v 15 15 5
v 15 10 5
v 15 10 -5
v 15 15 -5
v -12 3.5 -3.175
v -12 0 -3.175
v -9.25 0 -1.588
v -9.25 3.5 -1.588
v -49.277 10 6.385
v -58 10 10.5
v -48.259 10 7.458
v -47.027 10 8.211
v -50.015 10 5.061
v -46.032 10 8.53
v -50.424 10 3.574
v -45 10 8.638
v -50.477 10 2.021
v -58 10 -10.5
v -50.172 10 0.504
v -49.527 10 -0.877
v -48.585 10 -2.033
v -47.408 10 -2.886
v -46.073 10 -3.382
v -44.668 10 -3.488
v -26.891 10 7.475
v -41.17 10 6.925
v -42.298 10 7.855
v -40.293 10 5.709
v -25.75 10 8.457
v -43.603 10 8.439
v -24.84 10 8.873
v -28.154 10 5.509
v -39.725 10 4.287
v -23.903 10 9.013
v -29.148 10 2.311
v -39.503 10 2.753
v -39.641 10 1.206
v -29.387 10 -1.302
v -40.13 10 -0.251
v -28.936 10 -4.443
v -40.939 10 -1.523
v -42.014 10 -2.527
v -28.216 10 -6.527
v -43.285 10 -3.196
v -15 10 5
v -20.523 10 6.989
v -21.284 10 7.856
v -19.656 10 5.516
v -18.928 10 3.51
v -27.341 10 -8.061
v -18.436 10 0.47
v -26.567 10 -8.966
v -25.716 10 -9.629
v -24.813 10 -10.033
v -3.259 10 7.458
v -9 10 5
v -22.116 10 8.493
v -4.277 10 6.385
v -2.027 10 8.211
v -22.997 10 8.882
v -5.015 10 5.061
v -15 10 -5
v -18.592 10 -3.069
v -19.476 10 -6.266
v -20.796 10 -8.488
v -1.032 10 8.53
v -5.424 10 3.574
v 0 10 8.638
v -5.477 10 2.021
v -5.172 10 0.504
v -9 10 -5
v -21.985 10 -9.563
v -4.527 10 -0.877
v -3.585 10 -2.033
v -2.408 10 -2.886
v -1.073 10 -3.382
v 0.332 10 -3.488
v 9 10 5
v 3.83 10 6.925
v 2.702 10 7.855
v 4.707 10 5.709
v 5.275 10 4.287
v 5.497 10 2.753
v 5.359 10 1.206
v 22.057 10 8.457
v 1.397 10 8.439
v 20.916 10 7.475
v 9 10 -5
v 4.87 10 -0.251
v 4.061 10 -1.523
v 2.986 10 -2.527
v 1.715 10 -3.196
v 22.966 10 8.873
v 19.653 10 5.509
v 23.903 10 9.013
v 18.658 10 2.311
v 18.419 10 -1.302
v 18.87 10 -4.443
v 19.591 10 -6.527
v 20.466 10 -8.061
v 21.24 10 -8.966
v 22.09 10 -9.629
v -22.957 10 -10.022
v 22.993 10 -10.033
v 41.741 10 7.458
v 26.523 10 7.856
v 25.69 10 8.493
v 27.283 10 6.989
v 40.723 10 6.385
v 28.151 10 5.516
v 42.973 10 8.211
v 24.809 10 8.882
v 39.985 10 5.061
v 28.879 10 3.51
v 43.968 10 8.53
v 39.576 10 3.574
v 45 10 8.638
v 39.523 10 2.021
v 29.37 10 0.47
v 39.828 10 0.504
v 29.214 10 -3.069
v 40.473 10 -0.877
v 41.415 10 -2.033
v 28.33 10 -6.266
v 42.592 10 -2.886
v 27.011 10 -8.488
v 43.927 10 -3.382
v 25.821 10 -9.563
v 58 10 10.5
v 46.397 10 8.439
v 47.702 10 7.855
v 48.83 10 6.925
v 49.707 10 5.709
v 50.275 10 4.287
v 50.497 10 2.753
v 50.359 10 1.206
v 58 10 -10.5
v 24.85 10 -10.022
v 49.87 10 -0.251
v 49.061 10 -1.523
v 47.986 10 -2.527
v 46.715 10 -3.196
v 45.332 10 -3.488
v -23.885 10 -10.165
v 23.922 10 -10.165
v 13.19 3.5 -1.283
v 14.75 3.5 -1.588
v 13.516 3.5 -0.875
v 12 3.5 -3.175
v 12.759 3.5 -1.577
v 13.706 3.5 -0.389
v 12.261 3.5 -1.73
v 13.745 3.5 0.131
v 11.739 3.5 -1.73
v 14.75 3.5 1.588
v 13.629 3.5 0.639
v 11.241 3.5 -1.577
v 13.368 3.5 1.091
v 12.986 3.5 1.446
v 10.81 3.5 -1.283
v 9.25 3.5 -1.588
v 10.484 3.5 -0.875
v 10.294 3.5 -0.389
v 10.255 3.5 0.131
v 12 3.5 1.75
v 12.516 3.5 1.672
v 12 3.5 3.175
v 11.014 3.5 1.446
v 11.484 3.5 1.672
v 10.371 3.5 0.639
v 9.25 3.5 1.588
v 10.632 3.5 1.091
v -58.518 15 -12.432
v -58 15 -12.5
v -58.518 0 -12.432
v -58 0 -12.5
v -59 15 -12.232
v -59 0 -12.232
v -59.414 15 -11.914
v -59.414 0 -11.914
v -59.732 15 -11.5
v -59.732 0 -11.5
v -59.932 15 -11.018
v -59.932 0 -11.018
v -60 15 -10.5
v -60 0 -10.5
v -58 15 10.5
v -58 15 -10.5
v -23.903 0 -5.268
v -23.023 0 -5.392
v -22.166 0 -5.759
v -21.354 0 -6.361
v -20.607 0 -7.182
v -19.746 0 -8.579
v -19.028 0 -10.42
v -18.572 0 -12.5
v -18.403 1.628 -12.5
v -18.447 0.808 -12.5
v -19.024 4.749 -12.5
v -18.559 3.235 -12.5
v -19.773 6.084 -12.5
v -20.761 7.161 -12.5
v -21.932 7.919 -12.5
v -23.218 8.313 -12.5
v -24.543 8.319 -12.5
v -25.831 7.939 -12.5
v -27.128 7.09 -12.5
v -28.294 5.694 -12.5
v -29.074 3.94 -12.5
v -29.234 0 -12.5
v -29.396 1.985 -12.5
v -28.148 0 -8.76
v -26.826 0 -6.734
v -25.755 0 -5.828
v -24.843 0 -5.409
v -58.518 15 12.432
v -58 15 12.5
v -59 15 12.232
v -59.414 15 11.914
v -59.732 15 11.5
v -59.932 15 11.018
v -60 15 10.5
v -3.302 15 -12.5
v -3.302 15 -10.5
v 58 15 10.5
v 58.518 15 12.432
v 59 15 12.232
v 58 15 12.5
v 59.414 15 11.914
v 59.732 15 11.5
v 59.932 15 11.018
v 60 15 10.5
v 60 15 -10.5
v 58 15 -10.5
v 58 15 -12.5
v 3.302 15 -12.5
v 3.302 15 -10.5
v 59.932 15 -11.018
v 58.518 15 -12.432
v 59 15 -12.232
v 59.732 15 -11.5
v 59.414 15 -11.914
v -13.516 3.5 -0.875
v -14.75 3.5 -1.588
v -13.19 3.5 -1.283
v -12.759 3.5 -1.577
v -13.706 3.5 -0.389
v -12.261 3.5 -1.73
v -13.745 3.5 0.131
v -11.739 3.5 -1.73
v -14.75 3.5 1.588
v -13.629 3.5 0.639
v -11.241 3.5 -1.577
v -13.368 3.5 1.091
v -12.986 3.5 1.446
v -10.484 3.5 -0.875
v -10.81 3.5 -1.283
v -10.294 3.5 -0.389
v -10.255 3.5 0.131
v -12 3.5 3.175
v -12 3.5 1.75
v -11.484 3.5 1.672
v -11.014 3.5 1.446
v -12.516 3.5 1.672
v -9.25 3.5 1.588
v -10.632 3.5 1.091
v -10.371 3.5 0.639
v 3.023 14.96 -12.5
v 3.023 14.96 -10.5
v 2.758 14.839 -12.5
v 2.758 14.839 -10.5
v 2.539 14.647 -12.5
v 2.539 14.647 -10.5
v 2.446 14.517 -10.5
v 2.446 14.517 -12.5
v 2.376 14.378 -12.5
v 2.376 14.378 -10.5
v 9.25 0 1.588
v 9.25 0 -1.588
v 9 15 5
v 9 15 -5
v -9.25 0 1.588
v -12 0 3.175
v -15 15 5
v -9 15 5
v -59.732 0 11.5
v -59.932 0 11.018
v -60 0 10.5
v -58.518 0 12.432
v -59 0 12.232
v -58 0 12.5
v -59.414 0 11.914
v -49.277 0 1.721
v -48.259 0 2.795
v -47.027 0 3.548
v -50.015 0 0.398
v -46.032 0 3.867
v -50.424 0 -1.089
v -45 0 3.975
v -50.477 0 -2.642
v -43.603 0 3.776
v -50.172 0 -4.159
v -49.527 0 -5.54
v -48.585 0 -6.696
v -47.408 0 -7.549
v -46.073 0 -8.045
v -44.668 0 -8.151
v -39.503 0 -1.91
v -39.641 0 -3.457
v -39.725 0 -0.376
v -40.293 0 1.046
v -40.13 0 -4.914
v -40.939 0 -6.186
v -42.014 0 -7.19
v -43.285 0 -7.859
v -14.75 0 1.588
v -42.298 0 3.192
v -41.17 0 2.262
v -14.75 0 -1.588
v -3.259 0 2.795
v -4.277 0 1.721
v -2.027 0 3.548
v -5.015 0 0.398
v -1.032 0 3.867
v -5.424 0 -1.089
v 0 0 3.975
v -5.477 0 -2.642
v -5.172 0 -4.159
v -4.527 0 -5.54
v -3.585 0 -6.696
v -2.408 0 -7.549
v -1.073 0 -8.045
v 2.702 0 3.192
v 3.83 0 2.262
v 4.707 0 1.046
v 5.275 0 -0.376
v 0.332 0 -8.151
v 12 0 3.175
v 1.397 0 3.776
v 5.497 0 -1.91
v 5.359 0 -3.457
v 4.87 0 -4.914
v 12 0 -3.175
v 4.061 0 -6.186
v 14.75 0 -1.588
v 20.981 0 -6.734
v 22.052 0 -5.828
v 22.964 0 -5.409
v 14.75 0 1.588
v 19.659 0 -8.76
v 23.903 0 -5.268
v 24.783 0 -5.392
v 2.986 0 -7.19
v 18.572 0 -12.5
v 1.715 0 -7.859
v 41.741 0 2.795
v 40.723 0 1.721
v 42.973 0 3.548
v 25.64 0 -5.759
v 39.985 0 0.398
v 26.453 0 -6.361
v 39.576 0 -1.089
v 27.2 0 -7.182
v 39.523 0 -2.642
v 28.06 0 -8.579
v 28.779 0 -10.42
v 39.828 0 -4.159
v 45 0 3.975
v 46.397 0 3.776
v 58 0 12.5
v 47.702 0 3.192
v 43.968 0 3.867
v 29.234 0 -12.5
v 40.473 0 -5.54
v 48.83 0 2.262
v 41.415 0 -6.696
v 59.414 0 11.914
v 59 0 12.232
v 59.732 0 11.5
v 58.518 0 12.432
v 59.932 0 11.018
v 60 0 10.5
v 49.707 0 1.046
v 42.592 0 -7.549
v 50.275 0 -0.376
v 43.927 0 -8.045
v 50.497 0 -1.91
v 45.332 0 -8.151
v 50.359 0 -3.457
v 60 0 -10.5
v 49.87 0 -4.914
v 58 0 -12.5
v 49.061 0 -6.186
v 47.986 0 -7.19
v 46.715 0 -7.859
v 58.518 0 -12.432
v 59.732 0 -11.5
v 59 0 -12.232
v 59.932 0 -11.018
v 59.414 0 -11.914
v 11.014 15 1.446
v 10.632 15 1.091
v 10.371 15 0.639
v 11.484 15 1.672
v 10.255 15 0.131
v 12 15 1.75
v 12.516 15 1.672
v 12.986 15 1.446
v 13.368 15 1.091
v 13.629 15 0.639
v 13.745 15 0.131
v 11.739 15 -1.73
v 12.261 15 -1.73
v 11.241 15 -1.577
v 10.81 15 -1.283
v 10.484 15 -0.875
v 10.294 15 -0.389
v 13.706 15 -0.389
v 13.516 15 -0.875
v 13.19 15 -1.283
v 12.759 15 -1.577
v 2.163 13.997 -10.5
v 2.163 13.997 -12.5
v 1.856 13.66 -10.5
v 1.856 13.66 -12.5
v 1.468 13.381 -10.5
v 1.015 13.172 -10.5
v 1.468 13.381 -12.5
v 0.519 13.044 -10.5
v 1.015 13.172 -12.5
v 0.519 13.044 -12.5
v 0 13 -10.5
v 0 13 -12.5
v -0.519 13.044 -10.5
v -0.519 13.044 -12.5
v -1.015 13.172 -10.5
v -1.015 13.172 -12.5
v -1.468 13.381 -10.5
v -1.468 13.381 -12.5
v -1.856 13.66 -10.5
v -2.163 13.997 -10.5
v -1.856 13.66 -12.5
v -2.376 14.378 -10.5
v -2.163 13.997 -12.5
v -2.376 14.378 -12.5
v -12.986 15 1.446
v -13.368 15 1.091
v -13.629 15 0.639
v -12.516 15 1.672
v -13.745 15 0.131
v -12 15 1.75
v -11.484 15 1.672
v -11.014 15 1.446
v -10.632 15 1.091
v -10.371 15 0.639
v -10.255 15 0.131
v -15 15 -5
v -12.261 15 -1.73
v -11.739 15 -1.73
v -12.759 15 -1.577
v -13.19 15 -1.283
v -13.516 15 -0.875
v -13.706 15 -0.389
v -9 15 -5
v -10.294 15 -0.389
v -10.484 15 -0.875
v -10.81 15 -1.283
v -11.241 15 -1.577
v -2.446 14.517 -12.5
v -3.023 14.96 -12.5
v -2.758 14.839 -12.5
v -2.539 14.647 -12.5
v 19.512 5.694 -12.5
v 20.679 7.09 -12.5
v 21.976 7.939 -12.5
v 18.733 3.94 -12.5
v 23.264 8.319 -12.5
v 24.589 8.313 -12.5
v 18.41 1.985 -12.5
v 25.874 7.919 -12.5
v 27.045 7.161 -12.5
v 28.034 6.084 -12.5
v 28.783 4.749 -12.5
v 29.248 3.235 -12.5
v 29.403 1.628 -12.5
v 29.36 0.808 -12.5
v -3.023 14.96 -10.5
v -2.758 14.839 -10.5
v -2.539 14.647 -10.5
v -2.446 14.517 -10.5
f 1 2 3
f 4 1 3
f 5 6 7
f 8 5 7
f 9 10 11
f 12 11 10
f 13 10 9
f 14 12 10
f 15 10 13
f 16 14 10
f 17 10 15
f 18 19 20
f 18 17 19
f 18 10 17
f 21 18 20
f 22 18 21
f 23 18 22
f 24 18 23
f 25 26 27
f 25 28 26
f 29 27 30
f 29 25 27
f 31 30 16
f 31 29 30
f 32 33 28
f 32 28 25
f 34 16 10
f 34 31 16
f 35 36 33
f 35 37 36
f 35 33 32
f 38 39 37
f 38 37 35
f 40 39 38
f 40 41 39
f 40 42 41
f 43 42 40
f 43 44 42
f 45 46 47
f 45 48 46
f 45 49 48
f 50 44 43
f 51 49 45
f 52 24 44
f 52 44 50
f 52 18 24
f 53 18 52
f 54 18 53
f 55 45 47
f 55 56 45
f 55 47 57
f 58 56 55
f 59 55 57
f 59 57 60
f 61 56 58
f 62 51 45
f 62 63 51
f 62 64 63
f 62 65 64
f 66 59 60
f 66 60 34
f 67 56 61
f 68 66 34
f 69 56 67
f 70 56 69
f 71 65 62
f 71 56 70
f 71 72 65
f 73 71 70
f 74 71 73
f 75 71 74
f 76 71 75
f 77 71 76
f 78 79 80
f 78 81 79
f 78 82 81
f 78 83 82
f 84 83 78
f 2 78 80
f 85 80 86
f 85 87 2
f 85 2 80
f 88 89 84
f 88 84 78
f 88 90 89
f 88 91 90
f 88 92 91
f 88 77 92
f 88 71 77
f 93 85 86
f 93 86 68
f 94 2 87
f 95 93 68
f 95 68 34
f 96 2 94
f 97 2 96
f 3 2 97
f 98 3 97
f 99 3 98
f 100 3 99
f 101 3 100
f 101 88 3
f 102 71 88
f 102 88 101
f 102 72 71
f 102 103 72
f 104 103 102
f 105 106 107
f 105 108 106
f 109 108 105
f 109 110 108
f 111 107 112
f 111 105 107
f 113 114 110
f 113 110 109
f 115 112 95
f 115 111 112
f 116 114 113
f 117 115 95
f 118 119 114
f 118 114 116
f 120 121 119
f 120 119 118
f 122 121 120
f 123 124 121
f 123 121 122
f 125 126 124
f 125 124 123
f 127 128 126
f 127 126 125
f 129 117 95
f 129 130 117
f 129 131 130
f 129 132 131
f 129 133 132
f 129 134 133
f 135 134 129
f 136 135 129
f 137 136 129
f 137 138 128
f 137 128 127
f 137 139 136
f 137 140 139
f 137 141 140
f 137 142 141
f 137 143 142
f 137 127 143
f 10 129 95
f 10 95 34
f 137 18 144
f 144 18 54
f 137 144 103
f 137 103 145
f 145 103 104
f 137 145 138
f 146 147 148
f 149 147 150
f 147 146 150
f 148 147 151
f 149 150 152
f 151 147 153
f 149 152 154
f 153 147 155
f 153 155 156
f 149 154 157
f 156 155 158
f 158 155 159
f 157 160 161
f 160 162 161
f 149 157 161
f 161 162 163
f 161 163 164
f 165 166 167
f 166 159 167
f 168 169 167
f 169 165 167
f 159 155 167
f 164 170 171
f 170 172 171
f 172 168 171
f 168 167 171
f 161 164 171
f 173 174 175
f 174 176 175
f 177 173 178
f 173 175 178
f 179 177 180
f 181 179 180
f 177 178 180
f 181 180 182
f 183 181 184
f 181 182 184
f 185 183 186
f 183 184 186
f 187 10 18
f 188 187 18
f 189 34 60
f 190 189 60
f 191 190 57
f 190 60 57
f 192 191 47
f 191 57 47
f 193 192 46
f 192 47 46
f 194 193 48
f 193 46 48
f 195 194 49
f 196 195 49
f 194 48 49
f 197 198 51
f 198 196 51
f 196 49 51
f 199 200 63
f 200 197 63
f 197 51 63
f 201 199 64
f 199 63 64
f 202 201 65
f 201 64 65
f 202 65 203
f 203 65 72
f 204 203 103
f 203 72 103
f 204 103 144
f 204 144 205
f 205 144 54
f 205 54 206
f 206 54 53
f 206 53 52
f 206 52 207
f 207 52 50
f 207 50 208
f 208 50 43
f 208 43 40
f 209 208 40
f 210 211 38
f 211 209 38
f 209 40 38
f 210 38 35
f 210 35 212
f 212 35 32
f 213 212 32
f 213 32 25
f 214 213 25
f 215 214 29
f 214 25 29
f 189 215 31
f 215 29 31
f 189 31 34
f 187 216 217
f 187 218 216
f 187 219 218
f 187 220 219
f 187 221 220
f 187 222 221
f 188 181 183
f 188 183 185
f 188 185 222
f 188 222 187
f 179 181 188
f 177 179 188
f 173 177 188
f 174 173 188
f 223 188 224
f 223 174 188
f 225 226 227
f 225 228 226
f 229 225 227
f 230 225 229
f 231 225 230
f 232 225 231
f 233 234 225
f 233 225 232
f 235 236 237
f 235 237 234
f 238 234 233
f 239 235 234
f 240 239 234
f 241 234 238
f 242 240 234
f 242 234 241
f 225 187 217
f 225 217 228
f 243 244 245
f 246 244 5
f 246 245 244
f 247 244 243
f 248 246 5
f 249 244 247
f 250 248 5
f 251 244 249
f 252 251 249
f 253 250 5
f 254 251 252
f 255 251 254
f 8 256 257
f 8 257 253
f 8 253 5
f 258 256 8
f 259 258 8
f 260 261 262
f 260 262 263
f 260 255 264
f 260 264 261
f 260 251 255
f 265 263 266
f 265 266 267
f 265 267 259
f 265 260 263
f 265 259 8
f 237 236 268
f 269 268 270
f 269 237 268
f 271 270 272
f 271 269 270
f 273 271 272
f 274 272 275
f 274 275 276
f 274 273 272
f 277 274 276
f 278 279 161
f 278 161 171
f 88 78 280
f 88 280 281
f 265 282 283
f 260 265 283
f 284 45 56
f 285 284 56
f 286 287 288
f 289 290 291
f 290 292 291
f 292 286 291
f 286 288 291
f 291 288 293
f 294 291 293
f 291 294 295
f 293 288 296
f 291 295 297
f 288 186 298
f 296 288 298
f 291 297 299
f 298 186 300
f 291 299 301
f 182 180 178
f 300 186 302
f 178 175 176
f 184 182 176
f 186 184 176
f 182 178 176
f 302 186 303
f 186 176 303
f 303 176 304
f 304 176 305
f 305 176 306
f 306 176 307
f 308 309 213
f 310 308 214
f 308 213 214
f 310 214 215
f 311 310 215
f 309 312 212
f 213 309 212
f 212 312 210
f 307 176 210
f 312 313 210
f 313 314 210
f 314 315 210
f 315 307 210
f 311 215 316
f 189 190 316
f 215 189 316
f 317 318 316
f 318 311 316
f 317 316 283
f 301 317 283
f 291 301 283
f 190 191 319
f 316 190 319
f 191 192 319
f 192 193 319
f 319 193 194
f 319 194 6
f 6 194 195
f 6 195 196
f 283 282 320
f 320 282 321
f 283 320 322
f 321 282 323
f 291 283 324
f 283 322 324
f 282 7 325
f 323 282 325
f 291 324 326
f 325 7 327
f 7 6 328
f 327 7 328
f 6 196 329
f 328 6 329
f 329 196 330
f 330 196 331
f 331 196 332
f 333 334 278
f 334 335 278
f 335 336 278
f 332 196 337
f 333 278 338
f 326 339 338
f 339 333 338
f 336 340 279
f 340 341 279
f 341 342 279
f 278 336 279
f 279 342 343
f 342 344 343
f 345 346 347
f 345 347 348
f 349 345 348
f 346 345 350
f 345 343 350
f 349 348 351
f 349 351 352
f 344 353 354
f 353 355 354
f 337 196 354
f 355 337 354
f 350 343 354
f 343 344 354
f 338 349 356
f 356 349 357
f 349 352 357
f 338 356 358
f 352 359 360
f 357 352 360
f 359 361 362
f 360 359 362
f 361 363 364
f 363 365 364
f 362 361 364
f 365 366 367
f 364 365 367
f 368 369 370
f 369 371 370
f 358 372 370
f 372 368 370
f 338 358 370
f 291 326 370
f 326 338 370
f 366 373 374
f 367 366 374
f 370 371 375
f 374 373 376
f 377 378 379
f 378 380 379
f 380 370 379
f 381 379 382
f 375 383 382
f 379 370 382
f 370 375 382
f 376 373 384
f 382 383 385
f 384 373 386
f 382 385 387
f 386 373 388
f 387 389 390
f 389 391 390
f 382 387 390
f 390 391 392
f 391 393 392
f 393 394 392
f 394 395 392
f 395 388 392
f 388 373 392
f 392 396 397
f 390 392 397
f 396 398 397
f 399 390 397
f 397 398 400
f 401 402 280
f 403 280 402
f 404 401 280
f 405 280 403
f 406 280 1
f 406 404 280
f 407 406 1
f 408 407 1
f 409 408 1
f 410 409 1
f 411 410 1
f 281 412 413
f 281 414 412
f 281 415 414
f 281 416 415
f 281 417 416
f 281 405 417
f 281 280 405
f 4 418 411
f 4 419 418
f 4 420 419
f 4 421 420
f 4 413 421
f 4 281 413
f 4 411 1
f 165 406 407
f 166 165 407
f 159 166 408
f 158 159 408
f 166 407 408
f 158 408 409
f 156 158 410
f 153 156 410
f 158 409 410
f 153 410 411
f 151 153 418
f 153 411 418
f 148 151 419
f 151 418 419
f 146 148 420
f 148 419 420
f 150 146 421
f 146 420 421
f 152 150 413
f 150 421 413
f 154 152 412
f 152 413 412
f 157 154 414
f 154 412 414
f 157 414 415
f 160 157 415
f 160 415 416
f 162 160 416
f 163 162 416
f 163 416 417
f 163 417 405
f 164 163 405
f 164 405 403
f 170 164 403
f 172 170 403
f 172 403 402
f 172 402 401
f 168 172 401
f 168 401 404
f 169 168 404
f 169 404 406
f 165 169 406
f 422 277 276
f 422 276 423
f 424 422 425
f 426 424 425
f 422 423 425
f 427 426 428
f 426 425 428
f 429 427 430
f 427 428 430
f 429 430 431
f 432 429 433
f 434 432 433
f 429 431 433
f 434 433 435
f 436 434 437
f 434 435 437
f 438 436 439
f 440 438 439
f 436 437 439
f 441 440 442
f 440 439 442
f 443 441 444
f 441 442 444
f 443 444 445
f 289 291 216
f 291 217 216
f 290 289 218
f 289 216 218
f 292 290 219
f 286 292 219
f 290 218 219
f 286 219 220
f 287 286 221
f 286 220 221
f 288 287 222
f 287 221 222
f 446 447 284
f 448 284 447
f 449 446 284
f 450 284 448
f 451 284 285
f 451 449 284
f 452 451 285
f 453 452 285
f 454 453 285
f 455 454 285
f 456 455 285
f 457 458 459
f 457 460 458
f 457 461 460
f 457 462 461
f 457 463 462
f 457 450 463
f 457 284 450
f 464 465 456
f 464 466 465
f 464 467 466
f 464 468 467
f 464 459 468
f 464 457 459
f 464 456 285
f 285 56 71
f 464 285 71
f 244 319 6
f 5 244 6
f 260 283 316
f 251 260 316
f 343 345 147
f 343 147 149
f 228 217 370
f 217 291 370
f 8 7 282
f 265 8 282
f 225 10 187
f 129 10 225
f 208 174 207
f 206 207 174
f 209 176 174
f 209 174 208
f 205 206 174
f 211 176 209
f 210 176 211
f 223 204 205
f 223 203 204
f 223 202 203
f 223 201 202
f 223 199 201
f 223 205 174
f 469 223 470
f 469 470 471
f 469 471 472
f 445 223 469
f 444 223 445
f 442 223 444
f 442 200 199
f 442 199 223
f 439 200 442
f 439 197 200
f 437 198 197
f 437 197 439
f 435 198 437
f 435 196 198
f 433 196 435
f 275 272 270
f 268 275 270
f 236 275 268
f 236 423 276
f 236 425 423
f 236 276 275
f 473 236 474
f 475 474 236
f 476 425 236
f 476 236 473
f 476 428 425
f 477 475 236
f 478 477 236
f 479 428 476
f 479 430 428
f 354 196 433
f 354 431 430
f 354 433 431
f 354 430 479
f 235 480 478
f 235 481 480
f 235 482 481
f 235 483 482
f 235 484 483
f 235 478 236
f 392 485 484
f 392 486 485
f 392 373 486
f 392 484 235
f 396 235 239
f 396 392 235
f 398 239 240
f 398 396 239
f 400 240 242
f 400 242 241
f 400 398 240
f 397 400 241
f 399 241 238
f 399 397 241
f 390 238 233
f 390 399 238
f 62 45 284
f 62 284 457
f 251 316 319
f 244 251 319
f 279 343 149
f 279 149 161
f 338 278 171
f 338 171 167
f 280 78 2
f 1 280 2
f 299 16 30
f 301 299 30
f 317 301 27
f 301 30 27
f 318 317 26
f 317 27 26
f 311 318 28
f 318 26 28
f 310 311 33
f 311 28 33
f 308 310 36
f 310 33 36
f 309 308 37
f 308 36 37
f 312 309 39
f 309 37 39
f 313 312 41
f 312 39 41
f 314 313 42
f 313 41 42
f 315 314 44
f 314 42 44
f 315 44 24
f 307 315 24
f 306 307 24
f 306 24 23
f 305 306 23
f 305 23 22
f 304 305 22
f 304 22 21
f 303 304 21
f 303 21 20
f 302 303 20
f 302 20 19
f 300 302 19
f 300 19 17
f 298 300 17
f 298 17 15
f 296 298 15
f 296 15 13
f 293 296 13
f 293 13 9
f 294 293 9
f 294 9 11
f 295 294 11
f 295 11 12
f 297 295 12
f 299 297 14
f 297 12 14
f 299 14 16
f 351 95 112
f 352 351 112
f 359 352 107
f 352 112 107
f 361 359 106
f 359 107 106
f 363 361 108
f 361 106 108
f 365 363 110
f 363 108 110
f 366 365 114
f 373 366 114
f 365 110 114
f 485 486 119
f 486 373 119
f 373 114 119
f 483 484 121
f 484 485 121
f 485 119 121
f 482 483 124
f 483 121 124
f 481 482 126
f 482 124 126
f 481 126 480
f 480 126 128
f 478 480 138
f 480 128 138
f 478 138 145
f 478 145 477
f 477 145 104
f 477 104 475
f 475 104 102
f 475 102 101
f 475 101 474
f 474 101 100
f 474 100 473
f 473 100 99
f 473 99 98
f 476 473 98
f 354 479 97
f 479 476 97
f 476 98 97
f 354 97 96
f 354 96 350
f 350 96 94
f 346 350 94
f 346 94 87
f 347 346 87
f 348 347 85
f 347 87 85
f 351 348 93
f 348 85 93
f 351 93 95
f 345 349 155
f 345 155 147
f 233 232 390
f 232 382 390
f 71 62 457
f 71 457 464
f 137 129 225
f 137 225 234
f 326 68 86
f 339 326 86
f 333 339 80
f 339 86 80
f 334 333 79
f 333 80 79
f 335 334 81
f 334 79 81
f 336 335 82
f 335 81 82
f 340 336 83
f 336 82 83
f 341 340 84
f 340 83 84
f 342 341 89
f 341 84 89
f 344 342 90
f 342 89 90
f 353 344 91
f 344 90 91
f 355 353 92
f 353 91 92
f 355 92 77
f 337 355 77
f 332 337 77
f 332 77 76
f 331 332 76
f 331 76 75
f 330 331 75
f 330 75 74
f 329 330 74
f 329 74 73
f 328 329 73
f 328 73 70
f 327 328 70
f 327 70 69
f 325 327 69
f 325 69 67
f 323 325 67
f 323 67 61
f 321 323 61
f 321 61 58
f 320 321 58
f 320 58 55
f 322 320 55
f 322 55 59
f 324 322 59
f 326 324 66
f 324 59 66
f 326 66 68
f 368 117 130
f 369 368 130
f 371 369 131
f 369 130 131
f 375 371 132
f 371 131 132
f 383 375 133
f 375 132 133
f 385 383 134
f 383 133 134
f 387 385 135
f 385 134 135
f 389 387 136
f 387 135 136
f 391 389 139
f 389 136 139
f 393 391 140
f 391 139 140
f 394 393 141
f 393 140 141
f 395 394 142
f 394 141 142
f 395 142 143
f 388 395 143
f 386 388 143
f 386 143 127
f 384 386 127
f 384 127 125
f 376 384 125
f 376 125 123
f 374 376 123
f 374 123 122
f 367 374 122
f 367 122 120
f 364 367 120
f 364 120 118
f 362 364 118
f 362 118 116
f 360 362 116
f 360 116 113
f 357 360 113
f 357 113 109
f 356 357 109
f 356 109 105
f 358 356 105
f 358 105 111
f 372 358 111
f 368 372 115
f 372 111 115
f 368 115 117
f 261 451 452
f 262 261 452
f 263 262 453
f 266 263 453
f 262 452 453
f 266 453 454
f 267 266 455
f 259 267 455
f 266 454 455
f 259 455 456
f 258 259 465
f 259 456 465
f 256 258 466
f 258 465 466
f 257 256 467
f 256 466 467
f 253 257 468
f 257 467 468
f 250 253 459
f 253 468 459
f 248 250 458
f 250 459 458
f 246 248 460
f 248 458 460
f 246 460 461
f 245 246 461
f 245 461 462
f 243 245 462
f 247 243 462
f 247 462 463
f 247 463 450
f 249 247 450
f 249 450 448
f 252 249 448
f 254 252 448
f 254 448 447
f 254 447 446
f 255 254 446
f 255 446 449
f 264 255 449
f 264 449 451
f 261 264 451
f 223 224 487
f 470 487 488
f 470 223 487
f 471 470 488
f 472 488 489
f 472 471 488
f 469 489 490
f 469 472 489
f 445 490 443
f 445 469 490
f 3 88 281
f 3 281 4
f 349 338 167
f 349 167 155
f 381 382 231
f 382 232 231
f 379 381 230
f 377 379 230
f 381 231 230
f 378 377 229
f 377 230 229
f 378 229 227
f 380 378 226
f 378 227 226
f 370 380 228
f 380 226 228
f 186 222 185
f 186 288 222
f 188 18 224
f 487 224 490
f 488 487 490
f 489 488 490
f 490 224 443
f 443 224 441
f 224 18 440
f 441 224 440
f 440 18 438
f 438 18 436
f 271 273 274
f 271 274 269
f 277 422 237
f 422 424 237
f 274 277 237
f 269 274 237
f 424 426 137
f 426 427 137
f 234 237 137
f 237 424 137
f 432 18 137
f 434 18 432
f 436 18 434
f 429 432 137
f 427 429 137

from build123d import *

# Parameters (mm, degrees)
BASE_W                 = 120
BASE_H                 = 25
BASE_EXT_DEPTH         = 10
SKETCH3_R              = 5.5
LED_BOTTOM_CUT_DEPTH   = 65.13752525
LED_FOR_TOP_ROW_R      = 5.5
LED_TOP_CUT_DEPTH      = 66.86811155
SKETCH5_W              = 120
SKETCH5_H              = 25
SKETCH5_W_2            = 116
SKETCH5_H_2            = 21
WIRE_BOX_RIM_DEPTH     = 5
SKETCH6_W              = 6
SKETCH6_H              = 10
SUPPORT_SPACERS_DEPTH  = 5
SKETCH8_R              = 1.75
M3_SCREW_CUT_DEPTH     = 64.097147321
WIRE_CUT_OUT_RX        = 2.5
WIRE_CUT_OUT_RY        = 2
WIRE_CUT_OUT_CUT_DEPTH = 2
FILLET1_R              = 1
FILLET2_R              = 1
FILLET3_R              = 2
FILLET4_R              = 2
FILLET5_R              = 2
FILLET6_R              = 2
CUT_EXTRUDE5_DEPTH     = 3.5


with BuildPart() as part:
    # Base → Base EXT (new body)
    with BuildSketch(Plane(origin=(0, 0, 0), x_dir=(1, 0, 0), z_dir=(0, 1, 0))):
        Rectangle(BASE_W, BASE_H)
    extrude(amount=BASE_EXT_DEPTH)

    # Sketch3 → LED bottom CUT (cut, through all)
    with BuildSketch(Plane(origin=(0, 13.001715818, 6.062799655), x_dir=(1, 0, 0), z_dir=(0, 0.9063077870366496, 0.4226182617407003))):
        with Locations(Location((-45, 1.897335279, 0), (0, 0, 270))):
            Circle(SKETCH3_R)
        with Locations(Location((0, 1.897335279, 0), (0, 0, 270))):
            Circle(SKETCH3_R)
        with Locations(Location((45, 1.897335279, 0), (0, 0, 270))):
            Circle(SKETCH3_R)
    extrude(amount=-LED_BOTTOM_CUT_DEPTH, mode=Mode.SUBTRACT)

    # LED for Top Row → LED top CUT (cut, through all)
    with BuildSketch(Plane(origin=(0, 9.162978163, 13.086089), x_dir=(1, 0, 0), z_dir=(0, 0.5735764363510444, 0.819152044288993))):
        with Locations(Location((-23.903258736, 8.521814989, 0), (0, 0, 270))):
            Circle(LED_FOR_TOP_ROW_R)
        with Locations(Location((23.903258736, 8.521814989, 0), (0, 0, 270))):
            Circle(LED_FOR_TOP_ROW_R)
    extrude(amount=-LED_TOP_CUT_DEPTH, mode=Mode.SUBTRACT)

    # Sketch5 → Wire Box Rim (add)
    with BuildSketch(Plane(origin=(0, 10, 0), x_dir=(1, 0, 0), z_dir=(0, 1, 0))):
        Rectangle(SKETCH5_W, SKETCH5_H)
        Rectangle(SKETCH5_W_2, SKETCH5_H_2, mode=Mode.SUBTRACT)
    extrude(amount=WIRE_BOX_RIM_DEPTH)

    # Sketch6 → Support Spacers (add)
    with BuildSketch(Plane(origin=(0, 10, 0), x_dir=(1, 0, 0), z_dir=(0, 1, 0))):
        with Locations((-12, 0)):
            Rectangle(SKETCH6_W, SKETCH6_H)
        with Locations((12, 0)):
            Rectangle(SKETCH6_W, SKETCH6_H)
    extrude(amount=SUPPORT_SPACERS_DEPTH)

    # Sketch8 → M3 Screw CUT (cut, through all)
    with BuildSketch(Plane(origin=(0, 15, 0), x_dir=(1, 0, 0), z_dir=(0, 1, 0))):
        with Locations(Location((12, 0, 0), (0, 0, 270))):
            Circle(SKETCH8_R)
        with Locations(Location((-12, 0, 0), (0, 0, 270))):
            Circle(SKETCH8_R)
    extrude(amount=-M3_SCREW_CUT_DEPTH, mode=Mode.SUBTRACT)

    # Wire cut out → Wire cut out CUT (cut)
    with BuildSketch(Plane(origin=(0, 0, -12.5), x_dir=(-1, 0, 0), z_dir=(0, 0, -1))):
        with Locations(Location((0, 15), (0, 0, 180))):
            Ellipse(WIRE_CUT_OUT_RX, WIRE_CUT_OUT_RY)
    extrude(amount=-WIRE_CUT_OUT_CUT_DEPTH, mode=Mode.SUBTRACT)

    # Fillet1
    fillet1_edges = [part.edges().sort_by_distance(p)[0] for p in [
        (2.5, 15, -11.5),
    ]]
    fillet(fillet1_edges, radius=FILLET1_R)

    # Fillet2
    fillet2_edges = [part.edges().sort_by_distance(p)[0] for p in [
        (-2.5, 15, -11.5),
    ]]
    fillet(fillet2_edges, radius=FILLET2_R)

    # Fillet3
    fillet3_edges = [part.edges().sort_by_distance(p)[0] for p in [
        (-60, 7.5, -12.5),
    ]]
    fillet(fillet3_edges, radius=FILLET3_R)

    # Fillet4
    fillet4_edges = [part.edges().sort_by_distance(p)[0] for p in [
        (60, 7.5, -12.5),
    ]]
    fillet(fillet4_edges, radius=FILLET4_R)

    # Fillet5
    fillet5_edges = [part.edges().sort_by_distance(p)[0] for p in [
        (60, 7.5, 12.5),
    ]]
    fillet(fillet5_edges, radius=FILLET5_R)

    # Fillet6
    fillet6_edges = [part.edges().sort_by_distance(p)[0] for p in [
        (-60, 7.5, 12.5),
    ]]
    fillet(fillet6_edges, radius=FILLET6_R)

    # M3 Nut → Cut-Extrude5 (cut)
    with BuildSketch(Plane.XZ):
        Polygon((-12, 3.175426481), (-14.75, 1.58771324), (-14.75, -1.58771324), (-12, -3.175426481), (-9.25, -1.58771324), (-9.25, 1.58771324), align=None)
        Polygon((9.25, 1.58771324), (12, 3.175426481), (14.75, 1.58771324), (14.75, -1.58771324), (12, -3.175426481), (9.25, -1.58771324), align=None)
    extrude(amount=-CUT_EXTRUDE5_DEPTH, mode=Mode.SUBTRACT)


solid = part.part
